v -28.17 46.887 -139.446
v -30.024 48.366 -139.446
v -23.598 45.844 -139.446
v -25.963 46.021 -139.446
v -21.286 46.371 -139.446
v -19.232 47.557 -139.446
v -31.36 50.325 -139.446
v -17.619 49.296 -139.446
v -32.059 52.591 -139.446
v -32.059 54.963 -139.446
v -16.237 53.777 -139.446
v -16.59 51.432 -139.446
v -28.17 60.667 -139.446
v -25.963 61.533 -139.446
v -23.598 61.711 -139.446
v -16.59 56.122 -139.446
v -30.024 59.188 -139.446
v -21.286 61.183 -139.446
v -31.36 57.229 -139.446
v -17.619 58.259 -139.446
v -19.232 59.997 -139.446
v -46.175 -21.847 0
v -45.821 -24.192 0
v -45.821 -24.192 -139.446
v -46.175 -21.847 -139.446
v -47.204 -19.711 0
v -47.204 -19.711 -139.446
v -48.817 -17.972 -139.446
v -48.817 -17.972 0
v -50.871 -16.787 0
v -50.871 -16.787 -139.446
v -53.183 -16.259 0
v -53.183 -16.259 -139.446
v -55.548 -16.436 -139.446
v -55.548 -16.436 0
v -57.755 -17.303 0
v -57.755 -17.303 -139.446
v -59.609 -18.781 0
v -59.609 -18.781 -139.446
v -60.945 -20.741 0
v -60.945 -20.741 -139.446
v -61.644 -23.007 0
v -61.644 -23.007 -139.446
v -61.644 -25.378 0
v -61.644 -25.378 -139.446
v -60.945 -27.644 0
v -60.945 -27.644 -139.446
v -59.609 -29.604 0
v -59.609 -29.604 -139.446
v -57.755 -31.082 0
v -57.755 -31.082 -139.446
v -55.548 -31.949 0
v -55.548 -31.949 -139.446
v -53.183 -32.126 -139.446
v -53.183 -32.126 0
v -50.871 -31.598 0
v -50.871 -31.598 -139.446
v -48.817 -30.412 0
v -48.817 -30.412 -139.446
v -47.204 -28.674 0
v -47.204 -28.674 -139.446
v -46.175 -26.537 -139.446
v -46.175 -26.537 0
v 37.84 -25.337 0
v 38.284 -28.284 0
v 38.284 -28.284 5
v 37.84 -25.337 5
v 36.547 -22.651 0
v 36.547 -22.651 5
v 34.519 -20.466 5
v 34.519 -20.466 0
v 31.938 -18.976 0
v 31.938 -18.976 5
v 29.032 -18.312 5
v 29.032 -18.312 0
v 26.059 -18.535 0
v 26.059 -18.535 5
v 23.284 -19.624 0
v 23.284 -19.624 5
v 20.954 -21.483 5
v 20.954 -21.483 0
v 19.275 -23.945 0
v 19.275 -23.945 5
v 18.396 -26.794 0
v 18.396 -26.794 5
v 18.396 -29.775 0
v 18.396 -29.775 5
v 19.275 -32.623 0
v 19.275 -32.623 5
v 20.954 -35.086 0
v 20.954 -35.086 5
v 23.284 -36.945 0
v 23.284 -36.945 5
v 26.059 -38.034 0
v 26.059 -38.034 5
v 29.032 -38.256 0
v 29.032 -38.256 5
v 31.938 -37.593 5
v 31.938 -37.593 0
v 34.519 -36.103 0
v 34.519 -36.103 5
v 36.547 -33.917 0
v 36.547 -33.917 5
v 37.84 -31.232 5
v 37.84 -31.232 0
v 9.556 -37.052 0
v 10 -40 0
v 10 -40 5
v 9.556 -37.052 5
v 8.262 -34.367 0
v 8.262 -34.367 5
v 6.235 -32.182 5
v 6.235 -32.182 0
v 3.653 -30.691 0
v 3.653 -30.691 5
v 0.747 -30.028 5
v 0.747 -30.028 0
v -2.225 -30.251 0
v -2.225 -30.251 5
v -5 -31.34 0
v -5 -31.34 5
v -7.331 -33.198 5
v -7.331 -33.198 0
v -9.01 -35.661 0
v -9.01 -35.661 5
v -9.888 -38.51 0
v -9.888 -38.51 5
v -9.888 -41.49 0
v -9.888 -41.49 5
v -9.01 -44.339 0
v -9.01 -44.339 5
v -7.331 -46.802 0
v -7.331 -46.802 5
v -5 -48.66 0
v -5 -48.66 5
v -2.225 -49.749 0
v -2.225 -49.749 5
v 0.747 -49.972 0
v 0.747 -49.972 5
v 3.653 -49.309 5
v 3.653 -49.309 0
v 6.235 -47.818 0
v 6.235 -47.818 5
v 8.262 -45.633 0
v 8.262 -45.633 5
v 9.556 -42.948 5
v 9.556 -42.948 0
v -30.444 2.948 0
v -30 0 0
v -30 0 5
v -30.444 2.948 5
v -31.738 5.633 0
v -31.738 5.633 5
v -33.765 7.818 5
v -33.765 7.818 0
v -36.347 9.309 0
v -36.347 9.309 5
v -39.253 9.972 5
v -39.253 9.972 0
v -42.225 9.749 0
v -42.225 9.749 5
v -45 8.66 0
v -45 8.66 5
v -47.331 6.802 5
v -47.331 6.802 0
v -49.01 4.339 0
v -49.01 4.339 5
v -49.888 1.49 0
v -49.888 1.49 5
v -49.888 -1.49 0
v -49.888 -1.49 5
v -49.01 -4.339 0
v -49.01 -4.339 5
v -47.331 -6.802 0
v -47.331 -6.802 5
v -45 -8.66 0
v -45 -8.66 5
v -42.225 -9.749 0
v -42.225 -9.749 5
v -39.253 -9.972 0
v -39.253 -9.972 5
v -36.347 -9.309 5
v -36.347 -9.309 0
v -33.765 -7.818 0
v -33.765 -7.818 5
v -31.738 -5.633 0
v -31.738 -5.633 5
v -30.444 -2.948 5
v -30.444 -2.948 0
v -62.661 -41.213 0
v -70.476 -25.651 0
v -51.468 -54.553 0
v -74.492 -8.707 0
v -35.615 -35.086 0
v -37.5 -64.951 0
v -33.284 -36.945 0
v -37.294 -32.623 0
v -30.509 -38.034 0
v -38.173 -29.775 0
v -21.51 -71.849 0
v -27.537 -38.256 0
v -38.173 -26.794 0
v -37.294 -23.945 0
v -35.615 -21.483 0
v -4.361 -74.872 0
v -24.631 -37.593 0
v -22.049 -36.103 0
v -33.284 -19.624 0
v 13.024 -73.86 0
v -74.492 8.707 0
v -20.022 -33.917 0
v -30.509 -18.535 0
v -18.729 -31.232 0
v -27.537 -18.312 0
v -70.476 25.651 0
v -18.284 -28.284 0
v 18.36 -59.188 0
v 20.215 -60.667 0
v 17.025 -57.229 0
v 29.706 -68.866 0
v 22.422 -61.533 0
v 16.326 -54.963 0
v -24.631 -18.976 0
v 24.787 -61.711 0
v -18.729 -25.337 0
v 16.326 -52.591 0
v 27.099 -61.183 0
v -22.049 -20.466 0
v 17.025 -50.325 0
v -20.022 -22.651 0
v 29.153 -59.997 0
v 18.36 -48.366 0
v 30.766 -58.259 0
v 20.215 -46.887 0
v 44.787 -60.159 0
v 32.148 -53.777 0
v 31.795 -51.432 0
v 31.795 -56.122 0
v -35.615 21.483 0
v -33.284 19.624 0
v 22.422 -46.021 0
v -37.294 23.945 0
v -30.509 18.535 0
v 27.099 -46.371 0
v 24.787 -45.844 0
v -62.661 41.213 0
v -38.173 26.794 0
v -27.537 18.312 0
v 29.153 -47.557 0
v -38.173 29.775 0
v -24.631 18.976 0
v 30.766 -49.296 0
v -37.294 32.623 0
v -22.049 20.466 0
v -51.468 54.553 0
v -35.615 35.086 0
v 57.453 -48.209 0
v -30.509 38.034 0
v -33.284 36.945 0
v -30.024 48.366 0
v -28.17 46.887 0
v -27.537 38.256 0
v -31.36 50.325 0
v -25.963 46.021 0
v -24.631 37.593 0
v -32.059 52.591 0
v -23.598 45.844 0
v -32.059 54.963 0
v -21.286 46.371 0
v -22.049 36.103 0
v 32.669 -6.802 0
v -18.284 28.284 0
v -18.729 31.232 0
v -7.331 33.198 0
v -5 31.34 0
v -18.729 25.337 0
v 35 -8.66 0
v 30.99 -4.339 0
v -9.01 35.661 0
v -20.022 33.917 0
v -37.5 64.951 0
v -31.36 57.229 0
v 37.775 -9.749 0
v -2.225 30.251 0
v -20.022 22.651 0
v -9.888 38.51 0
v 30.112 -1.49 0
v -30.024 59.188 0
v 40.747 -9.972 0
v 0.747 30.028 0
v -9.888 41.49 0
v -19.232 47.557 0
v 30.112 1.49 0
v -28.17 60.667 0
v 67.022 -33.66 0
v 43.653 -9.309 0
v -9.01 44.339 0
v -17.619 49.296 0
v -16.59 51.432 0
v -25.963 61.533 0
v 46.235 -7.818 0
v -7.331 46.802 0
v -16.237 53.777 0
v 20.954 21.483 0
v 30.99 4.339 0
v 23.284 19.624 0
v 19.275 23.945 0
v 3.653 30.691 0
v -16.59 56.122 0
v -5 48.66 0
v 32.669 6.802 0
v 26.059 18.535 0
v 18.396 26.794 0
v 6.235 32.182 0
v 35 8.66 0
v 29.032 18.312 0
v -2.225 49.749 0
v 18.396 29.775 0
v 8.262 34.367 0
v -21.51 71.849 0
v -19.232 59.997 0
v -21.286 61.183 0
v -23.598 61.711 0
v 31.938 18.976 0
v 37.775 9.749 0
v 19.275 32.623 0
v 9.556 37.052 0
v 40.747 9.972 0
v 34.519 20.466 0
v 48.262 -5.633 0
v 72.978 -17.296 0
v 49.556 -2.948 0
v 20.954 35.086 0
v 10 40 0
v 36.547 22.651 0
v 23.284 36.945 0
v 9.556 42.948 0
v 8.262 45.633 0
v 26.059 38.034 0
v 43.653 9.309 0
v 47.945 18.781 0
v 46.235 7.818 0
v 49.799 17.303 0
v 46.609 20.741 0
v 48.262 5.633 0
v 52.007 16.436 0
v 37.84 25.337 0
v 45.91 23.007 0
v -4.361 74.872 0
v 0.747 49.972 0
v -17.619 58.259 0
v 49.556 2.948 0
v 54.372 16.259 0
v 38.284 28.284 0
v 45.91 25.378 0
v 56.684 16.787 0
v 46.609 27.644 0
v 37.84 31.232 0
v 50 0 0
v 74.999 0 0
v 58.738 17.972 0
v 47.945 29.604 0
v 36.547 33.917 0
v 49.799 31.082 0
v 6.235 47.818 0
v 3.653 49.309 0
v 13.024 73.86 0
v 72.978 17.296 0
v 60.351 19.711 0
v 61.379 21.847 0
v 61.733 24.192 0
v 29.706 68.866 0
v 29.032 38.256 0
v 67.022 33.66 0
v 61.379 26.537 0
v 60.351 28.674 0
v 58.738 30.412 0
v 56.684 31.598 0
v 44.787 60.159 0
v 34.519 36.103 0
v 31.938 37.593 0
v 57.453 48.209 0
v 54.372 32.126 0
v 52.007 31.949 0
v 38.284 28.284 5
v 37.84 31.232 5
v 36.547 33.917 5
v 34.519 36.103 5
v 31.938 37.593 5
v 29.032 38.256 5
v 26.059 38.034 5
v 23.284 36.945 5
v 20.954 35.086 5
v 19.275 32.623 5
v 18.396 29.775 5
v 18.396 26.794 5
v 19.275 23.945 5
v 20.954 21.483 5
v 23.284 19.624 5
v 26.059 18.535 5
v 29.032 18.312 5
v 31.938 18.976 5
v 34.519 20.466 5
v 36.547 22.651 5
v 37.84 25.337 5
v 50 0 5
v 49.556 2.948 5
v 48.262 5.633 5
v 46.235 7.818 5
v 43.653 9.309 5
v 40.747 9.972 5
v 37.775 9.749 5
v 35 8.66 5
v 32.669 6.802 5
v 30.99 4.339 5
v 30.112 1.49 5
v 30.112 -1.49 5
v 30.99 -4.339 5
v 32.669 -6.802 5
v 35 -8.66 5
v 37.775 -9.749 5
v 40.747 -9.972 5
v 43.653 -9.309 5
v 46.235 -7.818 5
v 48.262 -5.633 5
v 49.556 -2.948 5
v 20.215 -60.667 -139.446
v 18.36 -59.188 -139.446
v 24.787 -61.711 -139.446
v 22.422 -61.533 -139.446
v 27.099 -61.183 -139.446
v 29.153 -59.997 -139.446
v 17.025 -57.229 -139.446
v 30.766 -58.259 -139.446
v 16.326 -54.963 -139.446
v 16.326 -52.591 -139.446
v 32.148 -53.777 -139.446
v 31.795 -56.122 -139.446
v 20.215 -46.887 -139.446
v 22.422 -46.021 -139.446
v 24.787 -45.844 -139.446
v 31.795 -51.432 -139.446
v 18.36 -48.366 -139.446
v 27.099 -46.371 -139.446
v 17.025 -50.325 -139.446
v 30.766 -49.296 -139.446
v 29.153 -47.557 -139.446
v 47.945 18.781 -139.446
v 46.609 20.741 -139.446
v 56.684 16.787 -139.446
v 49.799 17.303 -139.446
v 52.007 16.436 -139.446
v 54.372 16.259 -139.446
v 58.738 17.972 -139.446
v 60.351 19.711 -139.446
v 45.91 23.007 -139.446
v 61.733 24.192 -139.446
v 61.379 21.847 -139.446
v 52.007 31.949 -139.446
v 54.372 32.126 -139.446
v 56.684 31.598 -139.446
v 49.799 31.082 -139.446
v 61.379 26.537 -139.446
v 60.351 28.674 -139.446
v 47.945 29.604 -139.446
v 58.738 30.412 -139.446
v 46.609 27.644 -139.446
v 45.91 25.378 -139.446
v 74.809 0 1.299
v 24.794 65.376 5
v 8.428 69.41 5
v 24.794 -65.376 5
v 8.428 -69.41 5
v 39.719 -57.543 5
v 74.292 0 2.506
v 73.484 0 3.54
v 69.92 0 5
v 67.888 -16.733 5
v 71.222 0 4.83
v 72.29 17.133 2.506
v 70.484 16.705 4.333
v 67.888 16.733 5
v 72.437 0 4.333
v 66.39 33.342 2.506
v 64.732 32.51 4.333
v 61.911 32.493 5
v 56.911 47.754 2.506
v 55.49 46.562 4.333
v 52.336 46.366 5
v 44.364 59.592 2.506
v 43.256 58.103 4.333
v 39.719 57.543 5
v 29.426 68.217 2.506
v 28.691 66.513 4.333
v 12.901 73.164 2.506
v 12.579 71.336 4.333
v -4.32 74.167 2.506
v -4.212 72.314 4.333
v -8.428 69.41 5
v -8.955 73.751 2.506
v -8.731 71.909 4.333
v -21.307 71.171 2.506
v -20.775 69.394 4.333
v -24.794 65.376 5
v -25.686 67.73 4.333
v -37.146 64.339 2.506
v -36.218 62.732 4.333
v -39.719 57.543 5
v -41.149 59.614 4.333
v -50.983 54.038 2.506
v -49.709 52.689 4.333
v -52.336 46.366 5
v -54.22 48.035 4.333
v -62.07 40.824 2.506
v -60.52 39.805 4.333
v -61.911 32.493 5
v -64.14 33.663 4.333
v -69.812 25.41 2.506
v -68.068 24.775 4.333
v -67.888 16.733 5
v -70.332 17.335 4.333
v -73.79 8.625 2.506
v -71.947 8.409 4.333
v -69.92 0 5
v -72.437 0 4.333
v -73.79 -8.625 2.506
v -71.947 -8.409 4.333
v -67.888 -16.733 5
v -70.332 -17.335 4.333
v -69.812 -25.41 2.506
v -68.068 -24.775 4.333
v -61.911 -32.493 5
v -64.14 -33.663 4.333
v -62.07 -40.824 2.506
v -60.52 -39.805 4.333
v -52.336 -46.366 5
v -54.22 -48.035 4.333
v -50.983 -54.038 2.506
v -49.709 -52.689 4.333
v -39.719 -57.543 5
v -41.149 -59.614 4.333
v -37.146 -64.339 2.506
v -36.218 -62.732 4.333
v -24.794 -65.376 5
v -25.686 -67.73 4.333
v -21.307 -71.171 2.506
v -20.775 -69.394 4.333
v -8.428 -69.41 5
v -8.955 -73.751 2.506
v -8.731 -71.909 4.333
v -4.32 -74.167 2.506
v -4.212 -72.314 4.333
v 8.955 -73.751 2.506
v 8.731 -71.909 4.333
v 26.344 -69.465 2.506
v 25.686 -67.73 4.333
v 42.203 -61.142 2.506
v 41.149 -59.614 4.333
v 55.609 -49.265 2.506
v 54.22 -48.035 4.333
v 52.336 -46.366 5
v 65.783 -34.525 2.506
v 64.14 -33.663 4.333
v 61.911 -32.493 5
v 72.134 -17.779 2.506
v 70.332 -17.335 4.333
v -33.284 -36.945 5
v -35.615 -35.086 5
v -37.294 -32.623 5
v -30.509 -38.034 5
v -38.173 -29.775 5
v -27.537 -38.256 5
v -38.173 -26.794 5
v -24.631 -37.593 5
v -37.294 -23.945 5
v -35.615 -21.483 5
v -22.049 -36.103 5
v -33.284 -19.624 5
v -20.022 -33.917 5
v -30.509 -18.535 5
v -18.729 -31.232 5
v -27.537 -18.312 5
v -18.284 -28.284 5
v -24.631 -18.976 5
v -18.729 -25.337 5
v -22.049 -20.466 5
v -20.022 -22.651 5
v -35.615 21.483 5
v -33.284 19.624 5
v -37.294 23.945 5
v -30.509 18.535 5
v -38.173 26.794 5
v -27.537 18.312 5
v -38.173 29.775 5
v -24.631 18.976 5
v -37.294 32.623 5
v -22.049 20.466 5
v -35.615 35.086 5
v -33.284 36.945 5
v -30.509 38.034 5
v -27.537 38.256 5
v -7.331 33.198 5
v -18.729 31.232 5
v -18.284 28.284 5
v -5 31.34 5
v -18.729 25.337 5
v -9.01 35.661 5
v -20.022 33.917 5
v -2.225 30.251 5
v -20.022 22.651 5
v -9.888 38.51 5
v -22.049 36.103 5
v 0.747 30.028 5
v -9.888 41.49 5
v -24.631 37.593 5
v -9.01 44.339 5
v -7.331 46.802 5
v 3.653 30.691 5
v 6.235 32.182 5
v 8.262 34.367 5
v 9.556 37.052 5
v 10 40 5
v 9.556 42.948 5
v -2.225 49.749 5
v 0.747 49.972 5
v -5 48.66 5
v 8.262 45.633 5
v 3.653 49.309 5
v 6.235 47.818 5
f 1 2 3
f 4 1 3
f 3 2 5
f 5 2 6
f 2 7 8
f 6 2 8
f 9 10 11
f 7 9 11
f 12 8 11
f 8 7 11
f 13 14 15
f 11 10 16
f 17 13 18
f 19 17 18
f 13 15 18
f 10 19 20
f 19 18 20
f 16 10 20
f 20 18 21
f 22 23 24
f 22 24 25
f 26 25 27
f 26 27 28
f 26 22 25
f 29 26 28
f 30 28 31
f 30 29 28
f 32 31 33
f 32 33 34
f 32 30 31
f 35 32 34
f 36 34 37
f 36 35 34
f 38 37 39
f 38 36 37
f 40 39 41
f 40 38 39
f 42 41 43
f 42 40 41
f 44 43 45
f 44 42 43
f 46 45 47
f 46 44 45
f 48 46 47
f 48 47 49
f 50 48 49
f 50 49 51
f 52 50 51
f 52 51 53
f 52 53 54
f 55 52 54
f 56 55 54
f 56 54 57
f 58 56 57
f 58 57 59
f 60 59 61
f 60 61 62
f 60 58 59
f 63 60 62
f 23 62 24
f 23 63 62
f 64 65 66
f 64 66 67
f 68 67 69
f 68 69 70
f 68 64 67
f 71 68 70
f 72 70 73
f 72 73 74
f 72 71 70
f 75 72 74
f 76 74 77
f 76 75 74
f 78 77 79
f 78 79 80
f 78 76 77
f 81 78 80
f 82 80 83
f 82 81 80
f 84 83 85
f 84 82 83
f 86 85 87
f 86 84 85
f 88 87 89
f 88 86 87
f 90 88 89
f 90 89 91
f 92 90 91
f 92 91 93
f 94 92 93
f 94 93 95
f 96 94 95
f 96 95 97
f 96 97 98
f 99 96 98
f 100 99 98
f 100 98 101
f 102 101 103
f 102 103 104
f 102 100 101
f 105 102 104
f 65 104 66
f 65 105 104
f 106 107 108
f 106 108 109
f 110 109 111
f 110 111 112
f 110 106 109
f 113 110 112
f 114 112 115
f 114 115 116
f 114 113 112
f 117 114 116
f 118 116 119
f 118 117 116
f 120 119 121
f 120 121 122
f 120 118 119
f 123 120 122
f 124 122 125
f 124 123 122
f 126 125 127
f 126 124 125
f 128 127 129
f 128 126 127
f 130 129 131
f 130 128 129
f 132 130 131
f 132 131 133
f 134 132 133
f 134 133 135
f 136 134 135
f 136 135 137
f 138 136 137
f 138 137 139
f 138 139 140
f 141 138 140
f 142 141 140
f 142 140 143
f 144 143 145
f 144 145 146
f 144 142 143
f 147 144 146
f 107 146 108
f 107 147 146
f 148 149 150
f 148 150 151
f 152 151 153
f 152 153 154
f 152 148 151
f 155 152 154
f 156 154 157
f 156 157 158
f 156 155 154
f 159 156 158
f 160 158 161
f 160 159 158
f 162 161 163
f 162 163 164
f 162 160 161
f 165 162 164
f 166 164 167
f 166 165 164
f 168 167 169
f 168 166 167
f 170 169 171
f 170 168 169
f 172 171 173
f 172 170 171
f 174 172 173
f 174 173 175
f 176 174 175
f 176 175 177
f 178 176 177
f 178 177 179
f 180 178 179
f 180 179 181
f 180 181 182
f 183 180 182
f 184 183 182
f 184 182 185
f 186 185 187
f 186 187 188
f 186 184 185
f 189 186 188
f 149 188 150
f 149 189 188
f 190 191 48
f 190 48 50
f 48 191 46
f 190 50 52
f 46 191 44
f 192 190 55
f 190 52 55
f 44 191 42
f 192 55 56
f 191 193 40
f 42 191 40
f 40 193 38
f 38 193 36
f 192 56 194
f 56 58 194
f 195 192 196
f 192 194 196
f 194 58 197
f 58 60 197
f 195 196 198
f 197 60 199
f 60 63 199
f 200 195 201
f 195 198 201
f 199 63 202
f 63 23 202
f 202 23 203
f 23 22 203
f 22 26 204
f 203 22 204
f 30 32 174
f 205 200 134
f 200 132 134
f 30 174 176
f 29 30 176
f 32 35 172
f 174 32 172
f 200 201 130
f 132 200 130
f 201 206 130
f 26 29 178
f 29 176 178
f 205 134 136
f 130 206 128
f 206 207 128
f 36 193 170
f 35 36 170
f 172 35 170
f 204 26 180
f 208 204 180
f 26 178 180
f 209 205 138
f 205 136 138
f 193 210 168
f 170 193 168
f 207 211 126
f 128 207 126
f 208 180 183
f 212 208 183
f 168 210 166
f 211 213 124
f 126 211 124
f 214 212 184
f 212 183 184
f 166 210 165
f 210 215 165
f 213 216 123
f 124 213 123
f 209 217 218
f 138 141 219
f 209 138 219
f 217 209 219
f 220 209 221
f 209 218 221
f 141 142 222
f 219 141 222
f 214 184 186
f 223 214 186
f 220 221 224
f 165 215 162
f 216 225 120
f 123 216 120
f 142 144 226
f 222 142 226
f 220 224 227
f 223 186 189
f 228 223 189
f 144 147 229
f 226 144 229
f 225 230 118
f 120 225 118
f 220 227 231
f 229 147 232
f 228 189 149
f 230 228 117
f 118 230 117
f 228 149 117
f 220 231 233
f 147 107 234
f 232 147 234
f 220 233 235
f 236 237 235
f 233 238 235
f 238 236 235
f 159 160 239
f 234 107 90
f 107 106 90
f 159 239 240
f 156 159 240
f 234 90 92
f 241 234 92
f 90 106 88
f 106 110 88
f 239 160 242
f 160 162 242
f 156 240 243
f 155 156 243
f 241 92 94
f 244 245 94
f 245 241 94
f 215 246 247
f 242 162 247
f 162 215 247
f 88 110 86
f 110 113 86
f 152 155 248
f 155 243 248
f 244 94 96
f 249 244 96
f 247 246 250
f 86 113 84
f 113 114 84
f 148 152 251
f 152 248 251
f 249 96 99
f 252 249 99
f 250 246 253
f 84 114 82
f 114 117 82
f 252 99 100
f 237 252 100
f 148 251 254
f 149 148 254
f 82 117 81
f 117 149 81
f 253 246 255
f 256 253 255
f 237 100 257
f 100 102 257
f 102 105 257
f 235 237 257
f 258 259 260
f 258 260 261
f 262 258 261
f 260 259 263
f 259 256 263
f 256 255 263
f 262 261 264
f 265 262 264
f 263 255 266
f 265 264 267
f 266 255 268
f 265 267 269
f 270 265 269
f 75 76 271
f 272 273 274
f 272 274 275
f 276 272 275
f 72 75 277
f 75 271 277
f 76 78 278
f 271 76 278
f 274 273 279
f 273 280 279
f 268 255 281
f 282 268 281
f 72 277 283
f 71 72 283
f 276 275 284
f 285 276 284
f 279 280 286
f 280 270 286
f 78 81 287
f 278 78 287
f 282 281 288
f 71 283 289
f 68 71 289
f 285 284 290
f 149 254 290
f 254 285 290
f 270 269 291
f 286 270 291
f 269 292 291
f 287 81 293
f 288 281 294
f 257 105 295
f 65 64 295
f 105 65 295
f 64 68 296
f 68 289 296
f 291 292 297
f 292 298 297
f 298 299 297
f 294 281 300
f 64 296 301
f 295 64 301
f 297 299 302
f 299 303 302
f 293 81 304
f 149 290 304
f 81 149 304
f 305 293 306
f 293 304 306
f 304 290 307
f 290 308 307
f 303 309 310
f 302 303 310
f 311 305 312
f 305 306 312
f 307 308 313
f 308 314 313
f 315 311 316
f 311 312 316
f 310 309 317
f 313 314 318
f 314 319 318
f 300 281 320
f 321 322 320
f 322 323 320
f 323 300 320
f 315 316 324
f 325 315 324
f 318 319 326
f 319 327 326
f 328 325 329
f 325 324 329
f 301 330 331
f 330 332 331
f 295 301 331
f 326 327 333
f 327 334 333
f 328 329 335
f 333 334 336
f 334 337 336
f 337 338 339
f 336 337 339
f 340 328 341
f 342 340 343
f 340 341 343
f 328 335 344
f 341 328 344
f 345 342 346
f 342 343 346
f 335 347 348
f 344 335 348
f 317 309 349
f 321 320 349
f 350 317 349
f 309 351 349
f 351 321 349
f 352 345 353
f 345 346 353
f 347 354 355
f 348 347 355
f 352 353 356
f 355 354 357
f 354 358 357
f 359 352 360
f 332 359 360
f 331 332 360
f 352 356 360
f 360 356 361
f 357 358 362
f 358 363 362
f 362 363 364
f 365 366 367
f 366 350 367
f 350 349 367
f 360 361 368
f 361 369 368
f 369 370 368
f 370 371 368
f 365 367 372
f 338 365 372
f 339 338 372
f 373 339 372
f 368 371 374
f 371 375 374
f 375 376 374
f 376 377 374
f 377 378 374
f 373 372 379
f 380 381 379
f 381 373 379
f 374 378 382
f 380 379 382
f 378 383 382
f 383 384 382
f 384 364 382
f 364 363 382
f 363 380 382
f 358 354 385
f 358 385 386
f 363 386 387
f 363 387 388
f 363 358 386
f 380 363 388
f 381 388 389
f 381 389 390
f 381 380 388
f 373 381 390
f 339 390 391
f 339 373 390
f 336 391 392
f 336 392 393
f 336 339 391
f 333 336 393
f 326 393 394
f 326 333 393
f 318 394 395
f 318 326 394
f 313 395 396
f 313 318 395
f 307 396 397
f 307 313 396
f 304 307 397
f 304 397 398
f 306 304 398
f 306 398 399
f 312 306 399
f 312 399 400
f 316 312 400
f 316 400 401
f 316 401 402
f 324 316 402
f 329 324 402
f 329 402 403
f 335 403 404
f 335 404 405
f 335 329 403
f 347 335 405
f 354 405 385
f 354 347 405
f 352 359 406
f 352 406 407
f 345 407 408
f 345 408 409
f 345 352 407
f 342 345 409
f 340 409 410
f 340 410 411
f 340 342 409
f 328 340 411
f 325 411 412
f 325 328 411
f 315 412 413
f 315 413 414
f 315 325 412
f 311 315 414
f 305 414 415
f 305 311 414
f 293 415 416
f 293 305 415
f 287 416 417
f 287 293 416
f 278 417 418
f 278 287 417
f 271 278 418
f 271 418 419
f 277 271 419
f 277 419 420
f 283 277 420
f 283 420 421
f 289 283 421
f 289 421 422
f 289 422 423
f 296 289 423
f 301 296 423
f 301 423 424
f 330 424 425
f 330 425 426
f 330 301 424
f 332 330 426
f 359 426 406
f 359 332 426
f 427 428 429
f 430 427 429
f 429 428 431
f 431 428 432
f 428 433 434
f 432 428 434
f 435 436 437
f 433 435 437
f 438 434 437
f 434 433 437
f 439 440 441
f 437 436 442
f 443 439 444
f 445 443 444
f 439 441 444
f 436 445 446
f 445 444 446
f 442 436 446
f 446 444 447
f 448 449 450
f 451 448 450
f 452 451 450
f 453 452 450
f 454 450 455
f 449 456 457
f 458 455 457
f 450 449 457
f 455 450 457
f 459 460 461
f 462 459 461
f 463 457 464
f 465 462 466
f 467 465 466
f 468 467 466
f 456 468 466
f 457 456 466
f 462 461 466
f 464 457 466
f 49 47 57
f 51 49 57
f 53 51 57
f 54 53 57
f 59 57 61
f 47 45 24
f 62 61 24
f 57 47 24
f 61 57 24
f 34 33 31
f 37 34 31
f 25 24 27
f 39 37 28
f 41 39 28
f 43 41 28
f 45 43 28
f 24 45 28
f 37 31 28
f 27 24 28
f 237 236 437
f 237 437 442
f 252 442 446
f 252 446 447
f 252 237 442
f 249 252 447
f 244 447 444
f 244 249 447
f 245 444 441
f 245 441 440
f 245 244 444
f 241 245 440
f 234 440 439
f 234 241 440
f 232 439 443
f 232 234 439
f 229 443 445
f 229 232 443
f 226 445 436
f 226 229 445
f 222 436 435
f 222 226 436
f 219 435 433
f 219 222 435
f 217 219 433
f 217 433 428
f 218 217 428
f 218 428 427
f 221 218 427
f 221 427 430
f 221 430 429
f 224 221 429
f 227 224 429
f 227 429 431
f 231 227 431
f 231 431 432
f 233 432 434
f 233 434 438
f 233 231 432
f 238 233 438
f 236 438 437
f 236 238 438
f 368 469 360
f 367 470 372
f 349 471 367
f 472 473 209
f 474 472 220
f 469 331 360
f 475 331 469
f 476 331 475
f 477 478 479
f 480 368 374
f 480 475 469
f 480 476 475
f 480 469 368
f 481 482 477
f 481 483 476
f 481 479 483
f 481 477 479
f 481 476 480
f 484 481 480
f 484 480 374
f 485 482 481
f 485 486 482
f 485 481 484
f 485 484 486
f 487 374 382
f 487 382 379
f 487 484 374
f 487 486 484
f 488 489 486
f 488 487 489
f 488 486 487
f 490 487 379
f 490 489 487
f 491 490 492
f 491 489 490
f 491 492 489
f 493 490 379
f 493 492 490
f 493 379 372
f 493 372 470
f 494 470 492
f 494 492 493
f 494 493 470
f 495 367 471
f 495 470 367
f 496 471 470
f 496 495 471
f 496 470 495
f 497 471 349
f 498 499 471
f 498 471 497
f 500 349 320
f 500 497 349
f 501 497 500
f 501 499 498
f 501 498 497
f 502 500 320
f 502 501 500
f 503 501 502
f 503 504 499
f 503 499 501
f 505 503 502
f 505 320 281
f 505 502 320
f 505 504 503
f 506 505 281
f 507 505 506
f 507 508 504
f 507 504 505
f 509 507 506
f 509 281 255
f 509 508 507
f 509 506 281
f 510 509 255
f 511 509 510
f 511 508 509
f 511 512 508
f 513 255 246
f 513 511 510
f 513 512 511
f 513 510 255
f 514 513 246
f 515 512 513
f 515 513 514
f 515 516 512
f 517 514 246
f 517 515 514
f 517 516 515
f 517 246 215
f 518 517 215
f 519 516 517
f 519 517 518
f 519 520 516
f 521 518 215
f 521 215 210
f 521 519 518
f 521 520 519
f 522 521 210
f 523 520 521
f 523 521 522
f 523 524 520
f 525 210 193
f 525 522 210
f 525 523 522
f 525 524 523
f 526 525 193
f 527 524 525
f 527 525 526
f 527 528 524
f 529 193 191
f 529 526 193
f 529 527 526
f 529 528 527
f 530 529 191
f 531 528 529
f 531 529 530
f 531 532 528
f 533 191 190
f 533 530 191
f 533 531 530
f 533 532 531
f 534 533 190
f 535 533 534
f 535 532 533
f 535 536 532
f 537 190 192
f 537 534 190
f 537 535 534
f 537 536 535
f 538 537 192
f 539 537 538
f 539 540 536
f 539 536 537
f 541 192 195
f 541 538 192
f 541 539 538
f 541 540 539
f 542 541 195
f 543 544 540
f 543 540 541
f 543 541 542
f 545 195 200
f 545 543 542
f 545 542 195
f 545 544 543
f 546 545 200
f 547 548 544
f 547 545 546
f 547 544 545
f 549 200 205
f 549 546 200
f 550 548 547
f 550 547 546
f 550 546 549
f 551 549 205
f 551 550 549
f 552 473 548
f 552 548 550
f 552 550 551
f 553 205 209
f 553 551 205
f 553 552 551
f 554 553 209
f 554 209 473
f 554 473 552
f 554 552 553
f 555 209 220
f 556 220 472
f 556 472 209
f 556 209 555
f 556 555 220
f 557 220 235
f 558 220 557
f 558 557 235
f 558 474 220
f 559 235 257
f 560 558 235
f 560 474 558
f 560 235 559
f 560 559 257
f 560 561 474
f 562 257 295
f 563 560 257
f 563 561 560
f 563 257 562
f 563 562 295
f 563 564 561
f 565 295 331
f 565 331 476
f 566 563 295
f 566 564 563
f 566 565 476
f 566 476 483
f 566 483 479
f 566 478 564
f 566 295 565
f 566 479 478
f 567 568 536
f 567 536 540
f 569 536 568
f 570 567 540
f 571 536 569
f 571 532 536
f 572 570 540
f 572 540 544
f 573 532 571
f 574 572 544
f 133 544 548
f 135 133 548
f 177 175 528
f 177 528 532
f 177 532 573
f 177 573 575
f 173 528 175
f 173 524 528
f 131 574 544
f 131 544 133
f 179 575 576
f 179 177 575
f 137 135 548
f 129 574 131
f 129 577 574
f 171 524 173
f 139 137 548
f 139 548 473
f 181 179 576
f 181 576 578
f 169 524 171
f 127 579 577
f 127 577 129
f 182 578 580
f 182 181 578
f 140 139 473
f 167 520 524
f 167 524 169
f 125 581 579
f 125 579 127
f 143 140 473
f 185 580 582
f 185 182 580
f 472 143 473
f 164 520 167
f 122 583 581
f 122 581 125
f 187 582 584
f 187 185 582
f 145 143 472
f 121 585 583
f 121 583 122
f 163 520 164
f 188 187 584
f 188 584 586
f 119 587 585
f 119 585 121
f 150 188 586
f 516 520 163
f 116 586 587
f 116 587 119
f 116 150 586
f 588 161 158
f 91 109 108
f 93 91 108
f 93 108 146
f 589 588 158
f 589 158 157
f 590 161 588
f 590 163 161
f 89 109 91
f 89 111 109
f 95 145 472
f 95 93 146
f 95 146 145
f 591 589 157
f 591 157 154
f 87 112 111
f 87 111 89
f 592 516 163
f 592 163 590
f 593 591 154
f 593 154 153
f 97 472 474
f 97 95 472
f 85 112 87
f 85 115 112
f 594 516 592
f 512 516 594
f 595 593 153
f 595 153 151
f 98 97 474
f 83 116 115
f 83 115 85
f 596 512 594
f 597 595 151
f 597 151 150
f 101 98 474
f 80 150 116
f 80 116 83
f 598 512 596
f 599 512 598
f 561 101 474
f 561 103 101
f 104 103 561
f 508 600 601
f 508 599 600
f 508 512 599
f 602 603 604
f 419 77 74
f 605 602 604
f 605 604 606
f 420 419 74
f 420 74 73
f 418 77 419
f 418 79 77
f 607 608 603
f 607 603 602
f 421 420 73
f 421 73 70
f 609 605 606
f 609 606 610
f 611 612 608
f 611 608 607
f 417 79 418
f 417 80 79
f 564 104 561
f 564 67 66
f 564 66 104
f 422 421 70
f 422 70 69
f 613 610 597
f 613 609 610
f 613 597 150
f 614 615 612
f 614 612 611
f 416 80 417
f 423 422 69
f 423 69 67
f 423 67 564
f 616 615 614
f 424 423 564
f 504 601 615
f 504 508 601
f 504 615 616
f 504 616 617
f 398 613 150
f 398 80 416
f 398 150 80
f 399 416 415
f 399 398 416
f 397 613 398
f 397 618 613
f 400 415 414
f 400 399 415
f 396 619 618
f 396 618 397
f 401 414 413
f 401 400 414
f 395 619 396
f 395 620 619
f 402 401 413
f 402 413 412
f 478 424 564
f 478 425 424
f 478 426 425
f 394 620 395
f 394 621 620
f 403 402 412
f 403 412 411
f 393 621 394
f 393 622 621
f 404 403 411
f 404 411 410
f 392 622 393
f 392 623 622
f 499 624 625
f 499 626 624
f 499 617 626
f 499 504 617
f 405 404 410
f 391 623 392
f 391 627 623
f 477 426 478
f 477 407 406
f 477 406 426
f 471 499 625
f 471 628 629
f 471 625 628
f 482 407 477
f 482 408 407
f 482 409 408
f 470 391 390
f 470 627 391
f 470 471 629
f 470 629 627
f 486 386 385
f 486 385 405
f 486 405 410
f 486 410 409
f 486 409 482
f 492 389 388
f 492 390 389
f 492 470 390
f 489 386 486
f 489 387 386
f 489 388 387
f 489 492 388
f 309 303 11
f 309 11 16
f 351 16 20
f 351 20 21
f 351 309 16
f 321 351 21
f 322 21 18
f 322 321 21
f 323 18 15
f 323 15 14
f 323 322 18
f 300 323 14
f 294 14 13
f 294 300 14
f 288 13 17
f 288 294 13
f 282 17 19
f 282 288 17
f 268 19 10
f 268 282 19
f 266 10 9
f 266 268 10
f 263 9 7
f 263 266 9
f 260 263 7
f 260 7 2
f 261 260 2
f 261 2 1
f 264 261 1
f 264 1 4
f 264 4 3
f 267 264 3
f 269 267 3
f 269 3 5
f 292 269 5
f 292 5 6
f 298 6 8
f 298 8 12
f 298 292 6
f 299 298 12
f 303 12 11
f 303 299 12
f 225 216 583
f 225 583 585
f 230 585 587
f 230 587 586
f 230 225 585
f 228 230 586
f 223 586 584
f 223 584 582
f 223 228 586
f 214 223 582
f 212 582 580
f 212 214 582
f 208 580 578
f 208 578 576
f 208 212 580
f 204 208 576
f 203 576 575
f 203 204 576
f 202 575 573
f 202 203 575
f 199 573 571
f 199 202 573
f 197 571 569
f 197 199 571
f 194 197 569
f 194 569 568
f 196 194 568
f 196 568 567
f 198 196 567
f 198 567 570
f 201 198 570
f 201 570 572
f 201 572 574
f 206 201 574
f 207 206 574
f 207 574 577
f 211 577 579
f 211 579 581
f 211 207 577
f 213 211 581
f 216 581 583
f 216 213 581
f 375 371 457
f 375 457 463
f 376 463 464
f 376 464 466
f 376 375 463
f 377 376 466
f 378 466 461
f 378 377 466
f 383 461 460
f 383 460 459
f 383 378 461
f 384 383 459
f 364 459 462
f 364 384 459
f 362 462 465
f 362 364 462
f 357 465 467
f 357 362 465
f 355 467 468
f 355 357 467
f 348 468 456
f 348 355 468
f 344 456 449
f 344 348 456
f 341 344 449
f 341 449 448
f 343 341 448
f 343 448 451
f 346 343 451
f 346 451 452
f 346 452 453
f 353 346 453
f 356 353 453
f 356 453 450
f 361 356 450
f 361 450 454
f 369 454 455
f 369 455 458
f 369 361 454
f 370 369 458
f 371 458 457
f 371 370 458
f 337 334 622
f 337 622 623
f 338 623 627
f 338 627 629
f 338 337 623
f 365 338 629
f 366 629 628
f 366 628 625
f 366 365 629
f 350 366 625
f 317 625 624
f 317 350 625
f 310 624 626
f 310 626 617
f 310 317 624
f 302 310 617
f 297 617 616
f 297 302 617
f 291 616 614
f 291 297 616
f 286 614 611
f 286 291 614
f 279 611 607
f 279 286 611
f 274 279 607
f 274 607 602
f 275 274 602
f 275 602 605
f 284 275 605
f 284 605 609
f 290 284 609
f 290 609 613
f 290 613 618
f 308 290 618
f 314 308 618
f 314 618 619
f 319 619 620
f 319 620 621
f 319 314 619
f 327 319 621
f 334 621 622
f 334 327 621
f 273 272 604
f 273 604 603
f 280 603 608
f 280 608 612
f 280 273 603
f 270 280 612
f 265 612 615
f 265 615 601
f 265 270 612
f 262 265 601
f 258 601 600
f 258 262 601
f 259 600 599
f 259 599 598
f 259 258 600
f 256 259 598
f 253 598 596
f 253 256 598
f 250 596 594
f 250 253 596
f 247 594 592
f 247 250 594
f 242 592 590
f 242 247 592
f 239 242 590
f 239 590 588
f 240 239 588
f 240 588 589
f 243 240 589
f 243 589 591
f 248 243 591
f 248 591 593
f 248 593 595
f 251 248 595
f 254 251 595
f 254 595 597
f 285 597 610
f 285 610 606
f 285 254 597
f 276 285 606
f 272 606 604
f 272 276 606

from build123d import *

# Parameters (mm, degrees)
F0_R     = 75
F0_R_2   = 10
F1_DEPTH = 5
F3_R     = 7.9557273046
F4_DEPTH = 139.446


# Not quite as in the source:
# - a fillet or chamfer that OpenCascade refuses, or shapes differently, is made with other operations: its cross-section is extruded or revolved along the edge and cut away or added


with BuildPart() as f1:
    # F0 (on Top) → F1 (new body)
    with BuildSketch(Plane.XY):
        Circle(F0_R)
        with Locations((-28.2842712475, -28.2842712475)):
            Circle(F0_R_2, mode=Mode.SUBTRACT)
        with Locations((0, -40)):
            Circle(F0_R_2, mode=Mode.SUBTRACT)
        with Locations((28.2842712475, -28.2842712475)):
            Circle(F0_R_2, mode=Mode.SUBTRACT)
        with Locations((-40, 0)):
            Circle(F0_R_2, mode=Mode.SUBTRACT)
        with Locations((-28.2842712475, 28.2842712475)):
            Circle(F0_R_2, mode=Mode.SUBTRACT)
        with Locations((28.2842712475, 28.2842712475)):
            Circle(F0_R_2, mode=Mode.SUBTRACT)
        with Locations((40, 0)):
            Circle(F0_R_2, mode=Mode.SUBTRACT)
        with Locations((0, 40)):
            Circle(F0_R_2, mode=Mode.SUBTRACT)
    extrude(amount=F1_DEPTH)

    # F2: fillet of radius 5.08 on 1 edges, made by hand

    # F2_s1 → F2_t2 (revolve, cut)
    with BuildSketch(Plane.XZ):
        with BuildLine():
            ThreePointArc((75, -0.08), (73.5121024484, 3.5121024484), (69.92, 5))
            Line((69.92, 5), (75, 5))
            Line((75, 5), (75, -0.08))
        make_face()
    revolve(axis=Axis((0, 0, 5), (0, 0, 1)), mode=Mode.SUBTRACT)

    # F3 (on Top) → F4 (join)
    with BuildSketch(Plane.XY):
        with Locations((24.1924598813, -53.7772104144)):
            Circle(F3_R)
        with Locations((53.7772104144, 24.1924598813)):
            Circle(F3_R)
        with Locations((-24.1924598813, 53.7772104144)):
            Circle(F3_R)
        with Locations((-53.7772104144, -24.1924598813)):
            Circle(F3_R)
    extrude(amount=-F4_DEPTH)


solid = f1.part
